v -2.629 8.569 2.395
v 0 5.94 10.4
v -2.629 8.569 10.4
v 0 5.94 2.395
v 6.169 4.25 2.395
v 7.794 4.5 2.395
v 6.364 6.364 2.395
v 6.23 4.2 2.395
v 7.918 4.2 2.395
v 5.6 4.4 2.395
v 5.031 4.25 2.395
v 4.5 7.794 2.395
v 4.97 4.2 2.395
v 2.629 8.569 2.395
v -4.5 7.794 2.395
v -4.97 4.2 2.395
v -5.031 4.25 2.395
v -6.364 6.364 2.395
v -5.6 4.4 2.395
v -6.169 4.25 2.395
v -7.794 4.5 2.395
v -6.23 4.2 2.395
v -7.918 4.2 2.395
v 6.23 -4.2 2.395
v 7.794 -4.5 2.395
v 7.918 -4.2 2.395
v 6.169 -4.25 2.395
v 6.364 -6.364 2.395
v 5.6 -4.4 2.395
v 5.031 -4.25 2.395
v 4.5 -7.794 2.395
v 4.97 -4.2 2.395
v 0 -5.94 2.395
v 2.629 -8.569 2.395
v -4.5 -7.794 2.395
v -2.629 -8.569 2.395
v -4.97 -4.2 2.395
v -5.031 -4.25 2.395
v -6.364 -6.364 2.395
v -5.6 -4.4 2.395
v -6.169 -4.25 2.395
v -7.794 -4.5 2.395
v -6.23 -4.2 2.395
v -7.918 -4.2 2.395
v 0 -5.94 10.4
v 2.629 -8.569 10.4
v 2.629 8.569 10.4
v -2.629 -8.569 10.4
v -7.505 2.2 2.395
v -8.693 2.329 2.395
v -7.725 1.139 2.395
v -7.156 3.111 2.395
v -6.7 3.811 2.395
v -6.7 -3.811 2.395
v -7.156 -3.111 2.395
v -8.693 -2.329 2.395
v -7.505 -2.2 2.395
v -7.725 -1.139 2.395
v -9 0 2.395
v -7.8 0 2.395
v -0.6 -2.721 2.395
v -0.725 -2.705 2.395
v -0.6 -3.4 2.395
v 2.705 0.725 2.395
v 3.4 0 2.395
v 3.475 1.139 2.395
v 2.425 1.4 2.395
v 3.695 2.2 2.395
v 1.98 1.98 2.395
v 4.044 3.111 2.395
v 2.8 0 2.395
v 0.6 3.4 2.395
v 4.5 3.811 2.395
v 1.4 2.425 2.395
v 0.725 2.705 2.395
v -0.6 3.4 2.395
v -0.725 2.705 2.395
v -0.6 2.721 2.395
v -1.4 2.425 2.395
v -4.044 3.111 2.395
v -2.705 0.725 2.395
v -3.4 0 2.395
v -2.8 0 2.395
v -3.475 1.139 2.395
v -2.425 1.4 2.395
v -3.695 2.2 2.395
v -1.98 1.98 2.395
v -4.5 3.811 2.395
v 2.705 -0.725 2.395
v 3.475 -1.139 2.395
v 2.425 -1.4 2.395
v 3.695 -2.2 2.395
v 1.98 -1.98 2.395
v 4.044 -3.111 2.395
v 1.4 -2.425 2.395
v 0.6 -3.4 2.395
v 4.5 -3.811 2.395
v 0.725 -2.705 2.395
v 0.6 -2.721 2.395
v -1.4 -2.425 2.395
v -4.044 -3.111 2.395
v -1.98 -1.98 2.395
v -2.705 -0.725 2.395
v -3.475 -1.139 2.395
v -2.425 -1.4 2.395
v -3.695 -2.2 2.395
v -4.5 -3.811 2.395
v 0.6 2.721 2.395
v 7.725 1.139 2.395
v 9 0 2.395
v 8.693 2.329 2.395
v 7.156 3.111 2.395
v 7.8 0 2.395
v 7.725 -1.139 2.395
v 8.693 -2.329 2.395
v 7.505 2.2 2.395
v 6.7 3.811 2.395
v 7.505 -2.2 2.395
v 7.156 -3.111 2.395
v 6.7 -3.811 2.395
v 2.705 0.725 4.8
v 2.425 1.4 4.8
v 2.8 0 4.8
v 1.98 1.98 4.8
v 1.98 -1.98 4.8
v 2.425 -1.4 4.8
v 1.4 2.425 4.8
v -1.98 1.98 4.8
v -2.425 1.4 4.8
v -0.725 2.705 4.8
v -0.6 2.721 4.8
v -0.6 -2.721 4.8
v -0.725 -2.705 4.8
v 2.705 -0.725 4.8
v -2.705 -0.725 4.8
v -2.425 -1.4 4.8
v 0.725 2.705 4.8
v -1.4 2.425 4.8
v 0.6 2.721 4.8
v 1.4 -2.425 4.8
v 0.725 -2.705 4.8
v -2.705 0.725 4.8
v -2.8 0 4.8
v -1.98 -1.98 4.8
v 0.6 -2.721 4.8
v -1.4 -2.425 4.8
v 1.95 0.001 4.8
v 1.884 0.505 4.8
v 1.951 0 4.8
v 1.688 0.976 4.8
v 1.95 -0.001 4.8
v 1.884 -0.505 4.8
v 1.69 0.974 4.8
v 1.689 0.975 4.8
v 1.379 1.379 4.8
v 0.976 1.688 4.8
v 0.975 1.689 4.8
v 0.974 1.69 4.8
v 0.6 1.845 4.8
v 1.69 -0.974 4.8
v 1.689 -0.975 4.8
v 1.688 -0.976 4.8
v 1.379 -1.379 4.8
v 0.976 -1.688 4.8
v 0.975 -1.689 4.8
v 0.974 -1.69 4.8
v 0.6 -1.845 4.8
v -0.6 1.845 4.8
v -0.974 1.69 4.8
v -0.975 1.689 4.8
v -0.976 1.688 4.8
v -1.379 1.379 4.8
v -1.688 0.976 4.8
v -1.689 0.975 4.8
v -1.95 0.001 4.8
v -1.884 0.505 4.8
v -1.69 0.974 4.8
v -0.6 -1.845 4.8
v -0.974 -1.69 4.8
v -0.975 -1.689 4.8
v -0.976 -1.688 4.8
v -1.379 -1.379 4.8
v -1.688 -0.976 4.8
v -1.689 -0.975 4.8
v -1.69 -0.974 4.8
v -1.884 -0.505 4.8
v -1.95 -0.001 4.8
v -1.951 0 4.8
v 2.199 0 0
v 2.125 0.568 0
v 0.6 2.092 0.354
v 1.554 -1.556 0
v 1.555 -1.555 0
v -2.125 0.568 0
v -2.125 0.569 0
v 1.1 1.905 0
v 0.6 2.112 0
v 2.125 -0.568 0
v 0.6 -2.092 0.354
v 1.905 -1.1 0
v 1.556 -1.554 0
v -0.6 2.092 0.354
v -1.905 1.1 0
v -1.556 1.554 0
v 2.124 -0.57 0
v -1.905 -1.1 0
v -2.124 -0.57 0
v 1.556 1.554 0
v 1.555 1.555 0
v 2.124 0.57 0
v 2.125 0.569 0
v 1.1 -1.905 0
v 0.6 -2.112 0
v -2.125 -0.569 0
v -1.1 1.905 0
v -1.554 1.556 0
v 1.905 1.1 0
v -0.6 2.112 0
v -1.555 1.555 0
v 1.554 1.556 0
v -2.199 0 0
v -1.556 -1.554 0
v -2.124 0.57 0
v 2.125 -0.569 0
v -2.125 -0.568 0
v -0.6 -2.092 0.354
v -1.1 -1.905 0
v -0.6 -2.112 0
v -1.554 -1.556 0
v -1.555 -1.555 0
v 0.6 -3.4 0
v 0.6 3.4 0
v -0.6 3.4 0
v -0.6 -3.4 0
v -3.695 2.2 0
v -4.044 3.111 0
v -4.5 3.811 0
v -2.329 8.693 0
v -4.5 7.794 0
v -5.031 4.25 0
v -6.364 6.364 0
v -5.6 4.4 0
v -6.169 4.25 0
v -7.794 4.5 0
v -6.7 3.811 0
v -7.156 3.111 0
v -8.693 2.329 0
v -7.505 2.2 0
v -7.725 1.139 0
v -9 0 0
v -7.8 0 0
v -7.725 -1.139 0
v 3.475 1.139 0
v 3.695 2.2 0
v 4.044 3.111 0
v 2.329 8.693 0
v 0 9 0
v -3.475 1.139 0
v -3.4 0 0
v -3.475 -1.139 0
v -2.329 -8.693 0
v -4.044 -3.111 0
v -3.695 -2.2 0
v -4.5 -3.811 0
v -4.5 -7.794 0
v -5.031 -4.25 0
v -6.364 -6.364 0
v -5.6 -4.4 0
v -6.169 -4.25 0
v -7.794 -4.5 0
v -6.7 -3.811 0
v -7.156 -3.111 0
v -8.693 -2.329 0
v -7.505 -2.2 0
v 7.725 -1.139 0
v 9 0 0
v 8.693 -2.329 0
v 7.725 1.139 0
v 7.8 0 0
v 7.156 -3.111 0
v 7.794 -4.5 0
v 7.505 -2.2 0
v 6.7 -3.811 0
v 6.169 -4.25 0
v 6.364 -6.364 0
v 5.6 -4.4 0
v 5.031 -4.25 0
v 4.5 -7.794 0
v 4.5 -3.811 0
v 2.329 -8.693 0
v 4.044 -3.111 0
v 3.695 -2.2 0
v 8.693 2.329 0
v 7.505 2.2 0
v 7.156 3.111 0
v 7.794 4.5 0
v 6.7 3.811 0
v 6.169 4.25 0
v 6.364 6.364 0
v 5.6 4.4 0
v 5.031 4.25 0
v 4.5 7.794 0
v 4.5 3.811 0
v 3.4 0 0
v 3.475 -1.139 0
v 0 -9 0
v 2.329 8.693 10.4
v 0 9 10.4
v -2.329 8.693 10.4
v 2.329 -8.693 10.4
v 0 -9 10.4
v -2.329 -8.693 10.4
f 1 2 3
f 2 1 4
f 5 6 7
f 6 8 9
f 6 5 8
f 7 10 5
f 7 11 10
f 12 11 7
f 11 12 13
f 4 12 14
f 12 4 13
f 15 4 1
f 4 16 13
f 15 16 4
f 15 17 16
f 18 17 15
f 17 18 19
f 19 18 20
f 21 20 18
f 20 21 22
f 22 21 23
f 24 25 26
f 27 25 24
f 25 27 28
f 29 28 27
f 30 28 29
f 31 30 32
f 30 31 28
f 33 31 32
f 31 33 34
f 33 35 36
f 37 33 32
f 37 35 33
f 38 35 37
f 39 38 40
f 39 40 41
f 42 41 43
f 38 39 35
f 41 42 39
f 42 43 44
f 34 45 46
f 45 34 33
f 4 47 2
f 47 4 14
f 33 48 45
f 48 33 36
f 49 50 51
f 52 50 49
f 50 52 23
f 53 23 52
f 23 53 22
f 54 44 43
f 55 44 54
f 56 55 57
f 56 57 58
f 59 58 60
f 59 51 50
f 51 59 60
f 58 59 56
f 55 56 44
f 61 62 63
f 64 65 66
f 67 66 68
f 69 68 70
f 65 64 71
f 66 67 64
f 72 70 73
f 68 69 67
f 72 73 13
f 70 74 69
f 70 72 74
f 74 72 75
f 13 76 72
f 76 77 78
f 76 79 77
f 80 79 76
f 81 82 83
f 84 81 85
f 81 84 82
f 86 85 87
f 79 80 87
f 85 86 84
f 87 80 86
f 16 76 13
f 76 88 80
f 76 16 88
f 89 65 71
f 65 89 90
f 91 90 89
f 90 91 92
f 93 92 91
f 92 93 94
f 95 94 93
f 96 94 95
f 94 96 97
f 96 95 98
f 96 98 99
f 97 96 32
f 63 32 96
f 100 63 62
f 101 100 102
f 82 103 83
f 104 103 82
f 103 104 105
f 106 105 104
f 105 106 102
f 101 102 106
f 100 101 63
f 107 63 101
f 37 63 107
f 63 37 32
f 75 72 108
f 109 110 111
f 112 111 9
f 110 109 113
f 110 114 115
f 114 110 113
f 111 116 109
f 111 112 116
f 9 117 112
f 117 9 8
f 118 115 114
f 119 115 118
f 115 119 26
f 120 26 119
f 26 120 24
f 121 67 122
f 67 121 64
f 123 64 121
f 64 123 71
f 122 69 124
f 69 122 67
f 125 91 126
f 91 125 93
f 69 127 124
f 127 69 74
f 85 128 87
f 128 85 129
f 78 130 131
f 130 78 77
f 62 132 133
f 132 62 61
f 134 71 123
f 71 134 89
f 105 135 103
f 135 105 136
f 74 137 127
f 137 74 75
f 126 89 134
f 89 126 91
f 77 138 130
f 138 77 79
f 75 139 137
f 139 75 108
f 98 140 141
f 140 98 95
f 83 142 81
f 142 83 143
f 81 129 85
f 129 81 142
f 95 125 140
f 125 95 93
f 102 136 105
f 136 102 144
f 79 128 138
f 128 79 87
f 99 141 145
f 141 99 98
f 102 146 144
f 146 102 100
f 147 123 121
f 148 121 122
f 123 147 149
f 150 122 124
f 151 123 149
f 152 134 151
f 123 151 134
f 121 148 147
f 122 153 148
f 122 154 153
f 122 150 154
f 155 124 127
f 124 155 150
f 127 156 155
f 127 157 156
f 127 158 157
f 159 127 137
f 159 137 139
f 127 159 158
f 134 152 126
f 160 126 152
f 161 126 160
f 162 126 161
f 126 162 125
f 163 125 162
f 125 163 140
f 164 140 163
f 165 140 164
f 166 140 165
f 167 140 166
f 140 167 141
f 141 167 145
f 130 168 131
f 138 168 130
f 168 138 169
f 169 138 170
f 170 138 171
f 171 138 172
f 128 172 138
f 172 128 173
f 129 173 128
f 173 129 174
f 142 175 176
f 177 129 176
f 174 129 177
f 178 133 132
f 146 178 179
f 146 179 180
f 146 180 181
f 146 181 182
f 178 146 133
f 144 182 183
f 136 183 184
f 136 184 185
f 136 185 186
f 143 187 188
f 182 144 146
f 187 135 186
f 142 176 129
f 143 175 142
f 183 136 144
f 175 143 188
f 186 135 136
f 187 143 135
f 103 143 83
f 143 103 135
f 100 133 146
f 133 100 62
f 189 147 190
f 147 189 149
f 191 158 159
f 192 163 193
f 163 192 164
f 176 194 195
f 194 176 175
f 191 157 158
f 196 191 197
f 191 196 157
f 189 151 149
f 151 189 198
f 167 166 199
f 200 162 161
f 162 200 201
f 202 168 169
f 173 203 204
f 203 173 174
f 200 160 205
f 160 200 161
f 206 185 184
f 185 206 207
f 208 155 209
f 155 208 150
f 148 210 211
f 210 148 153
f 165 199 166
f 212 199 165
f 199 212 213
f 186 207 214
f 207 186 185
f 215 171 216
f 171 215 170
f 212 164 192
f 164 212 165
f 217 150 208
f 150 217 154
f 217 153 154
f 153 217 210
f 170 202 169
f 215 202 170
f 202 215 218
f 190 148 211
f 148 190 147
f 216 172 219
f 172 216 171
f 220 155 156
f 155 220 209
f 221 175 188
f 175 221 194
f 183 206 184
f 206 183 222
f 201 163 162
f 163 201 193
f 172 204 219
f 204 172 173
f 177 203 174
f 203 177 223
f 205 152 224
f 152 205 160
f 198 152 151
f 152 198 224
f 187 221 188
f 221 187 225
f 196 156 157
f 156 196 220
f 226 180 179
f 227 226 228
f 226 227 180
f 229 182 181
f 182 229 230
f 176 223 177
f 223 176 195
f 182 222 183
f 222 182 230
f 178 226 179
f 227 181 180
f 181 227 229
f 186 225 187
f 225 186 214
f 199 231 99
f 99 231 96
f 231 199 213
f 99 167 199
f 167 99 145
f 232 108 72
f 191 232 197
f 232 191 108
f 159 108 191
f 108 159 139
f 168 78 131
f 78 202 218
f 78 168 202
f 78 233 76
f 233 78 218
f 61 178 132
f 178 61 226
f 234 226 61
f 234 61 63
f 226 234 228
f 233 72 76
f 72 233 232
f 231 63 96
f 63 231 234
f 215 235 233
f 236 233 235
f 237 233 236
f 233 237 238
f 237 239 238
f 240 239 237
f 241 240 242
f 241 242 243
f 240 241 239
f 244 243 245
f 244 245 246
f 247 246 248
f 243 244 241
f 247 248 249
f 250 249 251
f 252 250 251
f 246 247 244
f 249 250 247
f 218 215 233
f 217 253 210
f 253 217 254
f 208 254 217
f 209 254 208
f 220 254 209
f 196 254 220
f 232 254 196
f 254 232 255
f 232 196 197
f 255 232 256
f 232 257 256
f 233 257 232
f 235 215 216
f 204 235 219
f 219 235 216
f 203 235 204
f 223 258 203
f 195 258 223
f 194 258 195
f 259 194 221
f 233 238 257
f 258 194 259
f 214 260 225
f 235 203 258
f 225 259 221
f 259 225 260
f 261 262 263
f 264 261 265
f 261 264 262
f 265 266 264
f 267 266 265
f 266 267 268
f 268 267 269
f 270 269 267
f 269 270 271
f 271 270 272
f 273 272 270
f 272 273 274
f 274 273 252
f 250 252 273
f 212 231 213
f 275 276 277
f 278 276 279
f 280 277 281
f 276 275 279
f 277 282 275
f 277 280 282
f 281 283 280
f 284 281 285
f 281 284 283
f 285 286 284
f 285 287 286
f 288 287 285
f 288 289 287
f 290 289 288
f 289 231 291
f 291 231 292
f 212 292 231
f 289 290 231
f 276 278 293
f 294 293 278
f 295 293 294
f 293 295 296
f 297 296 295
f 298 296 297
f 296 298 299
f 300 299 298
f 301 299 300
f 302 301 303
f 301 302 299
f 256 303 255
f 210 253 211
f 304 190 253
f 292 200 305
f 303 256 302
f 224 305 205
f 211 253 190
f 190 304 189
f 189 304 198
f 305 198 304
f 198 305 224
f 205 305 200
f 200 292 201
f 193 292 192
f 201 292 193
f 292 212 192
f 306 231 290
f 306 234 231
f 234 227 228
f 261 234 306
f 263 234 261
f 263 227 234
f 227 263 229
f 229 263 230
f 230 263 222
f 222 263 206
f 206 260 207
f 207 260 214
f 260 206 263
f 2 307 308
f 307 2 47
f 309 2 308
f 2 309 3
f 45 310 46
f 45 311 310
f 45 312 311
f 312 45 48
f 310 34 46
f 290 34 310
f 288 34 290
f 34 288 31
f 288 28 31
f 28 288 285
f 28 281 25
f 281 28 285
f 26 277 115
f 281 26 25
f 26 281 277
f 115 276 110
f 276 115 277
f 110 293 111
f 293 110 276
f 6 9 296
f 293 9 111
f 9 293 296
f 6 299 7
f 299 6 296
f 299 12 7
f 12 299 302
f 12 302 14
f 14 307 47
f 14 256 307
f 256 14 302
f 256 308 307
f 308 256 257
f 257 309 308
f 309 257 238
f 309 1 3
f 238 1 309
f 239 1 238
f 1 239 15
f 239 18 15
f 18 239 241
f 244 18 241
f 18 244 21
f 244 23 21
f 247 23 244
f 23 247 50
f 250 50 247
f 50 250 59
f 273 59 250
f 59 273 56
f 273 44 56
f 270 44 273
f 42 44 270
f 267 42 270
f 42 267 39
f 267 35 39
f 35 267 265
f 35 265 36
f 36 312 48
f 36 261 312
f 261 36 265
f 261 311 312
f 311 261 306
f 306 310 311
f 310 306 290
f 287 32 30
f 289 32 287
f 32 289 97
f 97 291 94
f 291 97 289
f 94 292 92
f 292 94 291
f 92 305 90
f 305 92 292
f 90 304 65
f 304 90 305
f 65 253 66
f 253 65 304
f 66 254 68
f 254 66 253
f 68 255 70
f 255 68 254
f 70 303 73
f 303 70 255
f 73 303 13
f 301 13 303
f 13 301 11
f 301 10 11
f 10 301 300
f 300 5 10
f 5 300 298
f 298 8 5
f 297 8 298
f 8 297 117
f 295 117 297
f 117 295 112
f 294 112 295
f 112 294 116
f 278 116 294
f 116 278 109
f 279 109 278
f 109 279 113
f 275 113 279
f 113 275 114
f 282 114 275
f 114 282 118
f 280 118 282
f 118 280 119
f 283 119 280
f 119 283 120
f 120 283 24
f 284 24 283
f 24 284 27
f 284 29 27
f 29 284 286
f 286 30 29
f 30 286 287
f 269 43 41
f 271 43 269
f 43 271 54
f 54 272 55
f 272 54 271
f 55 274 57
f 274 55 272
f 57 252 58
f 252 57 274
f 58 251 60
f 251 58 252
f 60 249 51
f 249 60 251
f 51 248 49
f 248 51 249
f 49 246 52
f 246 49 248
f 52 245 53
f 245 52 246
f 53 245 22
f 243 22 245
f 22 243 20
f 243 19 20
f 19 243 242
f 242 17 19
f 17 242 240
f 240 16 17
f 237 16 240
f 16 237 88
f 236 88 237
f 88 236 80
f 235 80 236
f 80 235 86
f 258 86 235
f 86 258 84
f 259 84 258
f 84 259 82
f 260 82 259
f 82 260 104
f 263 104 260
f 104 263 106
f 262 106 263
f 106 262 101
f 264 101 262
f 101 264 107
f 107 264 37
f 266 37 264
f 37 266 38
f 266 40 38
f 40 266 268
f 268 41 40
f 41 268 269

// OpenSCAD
thickness = 2.4; // mm
height = 8;
outer_diameter = 18; //mm
inner_hole_diameter = 4.40; //mm
inner_taper=0.5;
outer_hole_diameter_n = (outer_diameter - inner_hole_diameter - 2 * thickness) / 2;
outer_hole_diameter_w = 2 * outer_hole_diameter_n;
$fn=24;

difference() {
  linear_extrude(thickness + height, true) {
    difference() {
      circle(d = outer_diameter);

      translate([(outer_diameter + inner_hole_diameter) / 4,0,0]) {
        resize([outer_hole_diameter_n, outer_hole_diameter_w], true) {
          circle(d = inner_hole_diameter);
        }
      }

      translate([(outer_diameter + inner_hole_diameter) / -4,0,0]) {
        resize([outer_hole_diameter_n, outer_hole_diameter_w], true) {
          circle(d = inner_hole_diameter);
        }
      }
    }
  }

  // carve-out the inside
  difference() {
    union() {
      translate([0,0,height/2 + thickness]) {
        cube([outer_diameter + 0.01, outer_diameter - 4 * thickness, height + 0.01], true);
      }
      rotate([0, 0, 45]) {
        translate([0,0,height/2 + thickness]) {
          cube([outer_diameter - 4 * thickness, outer_diameter + 0.01, height + 0.01], true);
          cube([outer_diameter + 0.01, outer_diameter - 4 * thickness, height + 0.01], true);
        }
      }
    }
    // thicker ring around inner hole
    cylinder(d=inner_hole_diameter+thickness/2, h=2*thickness);
  }

  // center hole
  translate([0,0,-0.01]) {
    cylinder(d1 = inner_hole_diameter,
             d2=inner_hole_diameter-inner_taper,
             h=thickness*2+0.02);
    translate([0,0,thickness]) {
    cube([thickness/2,inner_hole_diameter + thickness,thickness*2+0.03],center=true);
    }
  }
}
